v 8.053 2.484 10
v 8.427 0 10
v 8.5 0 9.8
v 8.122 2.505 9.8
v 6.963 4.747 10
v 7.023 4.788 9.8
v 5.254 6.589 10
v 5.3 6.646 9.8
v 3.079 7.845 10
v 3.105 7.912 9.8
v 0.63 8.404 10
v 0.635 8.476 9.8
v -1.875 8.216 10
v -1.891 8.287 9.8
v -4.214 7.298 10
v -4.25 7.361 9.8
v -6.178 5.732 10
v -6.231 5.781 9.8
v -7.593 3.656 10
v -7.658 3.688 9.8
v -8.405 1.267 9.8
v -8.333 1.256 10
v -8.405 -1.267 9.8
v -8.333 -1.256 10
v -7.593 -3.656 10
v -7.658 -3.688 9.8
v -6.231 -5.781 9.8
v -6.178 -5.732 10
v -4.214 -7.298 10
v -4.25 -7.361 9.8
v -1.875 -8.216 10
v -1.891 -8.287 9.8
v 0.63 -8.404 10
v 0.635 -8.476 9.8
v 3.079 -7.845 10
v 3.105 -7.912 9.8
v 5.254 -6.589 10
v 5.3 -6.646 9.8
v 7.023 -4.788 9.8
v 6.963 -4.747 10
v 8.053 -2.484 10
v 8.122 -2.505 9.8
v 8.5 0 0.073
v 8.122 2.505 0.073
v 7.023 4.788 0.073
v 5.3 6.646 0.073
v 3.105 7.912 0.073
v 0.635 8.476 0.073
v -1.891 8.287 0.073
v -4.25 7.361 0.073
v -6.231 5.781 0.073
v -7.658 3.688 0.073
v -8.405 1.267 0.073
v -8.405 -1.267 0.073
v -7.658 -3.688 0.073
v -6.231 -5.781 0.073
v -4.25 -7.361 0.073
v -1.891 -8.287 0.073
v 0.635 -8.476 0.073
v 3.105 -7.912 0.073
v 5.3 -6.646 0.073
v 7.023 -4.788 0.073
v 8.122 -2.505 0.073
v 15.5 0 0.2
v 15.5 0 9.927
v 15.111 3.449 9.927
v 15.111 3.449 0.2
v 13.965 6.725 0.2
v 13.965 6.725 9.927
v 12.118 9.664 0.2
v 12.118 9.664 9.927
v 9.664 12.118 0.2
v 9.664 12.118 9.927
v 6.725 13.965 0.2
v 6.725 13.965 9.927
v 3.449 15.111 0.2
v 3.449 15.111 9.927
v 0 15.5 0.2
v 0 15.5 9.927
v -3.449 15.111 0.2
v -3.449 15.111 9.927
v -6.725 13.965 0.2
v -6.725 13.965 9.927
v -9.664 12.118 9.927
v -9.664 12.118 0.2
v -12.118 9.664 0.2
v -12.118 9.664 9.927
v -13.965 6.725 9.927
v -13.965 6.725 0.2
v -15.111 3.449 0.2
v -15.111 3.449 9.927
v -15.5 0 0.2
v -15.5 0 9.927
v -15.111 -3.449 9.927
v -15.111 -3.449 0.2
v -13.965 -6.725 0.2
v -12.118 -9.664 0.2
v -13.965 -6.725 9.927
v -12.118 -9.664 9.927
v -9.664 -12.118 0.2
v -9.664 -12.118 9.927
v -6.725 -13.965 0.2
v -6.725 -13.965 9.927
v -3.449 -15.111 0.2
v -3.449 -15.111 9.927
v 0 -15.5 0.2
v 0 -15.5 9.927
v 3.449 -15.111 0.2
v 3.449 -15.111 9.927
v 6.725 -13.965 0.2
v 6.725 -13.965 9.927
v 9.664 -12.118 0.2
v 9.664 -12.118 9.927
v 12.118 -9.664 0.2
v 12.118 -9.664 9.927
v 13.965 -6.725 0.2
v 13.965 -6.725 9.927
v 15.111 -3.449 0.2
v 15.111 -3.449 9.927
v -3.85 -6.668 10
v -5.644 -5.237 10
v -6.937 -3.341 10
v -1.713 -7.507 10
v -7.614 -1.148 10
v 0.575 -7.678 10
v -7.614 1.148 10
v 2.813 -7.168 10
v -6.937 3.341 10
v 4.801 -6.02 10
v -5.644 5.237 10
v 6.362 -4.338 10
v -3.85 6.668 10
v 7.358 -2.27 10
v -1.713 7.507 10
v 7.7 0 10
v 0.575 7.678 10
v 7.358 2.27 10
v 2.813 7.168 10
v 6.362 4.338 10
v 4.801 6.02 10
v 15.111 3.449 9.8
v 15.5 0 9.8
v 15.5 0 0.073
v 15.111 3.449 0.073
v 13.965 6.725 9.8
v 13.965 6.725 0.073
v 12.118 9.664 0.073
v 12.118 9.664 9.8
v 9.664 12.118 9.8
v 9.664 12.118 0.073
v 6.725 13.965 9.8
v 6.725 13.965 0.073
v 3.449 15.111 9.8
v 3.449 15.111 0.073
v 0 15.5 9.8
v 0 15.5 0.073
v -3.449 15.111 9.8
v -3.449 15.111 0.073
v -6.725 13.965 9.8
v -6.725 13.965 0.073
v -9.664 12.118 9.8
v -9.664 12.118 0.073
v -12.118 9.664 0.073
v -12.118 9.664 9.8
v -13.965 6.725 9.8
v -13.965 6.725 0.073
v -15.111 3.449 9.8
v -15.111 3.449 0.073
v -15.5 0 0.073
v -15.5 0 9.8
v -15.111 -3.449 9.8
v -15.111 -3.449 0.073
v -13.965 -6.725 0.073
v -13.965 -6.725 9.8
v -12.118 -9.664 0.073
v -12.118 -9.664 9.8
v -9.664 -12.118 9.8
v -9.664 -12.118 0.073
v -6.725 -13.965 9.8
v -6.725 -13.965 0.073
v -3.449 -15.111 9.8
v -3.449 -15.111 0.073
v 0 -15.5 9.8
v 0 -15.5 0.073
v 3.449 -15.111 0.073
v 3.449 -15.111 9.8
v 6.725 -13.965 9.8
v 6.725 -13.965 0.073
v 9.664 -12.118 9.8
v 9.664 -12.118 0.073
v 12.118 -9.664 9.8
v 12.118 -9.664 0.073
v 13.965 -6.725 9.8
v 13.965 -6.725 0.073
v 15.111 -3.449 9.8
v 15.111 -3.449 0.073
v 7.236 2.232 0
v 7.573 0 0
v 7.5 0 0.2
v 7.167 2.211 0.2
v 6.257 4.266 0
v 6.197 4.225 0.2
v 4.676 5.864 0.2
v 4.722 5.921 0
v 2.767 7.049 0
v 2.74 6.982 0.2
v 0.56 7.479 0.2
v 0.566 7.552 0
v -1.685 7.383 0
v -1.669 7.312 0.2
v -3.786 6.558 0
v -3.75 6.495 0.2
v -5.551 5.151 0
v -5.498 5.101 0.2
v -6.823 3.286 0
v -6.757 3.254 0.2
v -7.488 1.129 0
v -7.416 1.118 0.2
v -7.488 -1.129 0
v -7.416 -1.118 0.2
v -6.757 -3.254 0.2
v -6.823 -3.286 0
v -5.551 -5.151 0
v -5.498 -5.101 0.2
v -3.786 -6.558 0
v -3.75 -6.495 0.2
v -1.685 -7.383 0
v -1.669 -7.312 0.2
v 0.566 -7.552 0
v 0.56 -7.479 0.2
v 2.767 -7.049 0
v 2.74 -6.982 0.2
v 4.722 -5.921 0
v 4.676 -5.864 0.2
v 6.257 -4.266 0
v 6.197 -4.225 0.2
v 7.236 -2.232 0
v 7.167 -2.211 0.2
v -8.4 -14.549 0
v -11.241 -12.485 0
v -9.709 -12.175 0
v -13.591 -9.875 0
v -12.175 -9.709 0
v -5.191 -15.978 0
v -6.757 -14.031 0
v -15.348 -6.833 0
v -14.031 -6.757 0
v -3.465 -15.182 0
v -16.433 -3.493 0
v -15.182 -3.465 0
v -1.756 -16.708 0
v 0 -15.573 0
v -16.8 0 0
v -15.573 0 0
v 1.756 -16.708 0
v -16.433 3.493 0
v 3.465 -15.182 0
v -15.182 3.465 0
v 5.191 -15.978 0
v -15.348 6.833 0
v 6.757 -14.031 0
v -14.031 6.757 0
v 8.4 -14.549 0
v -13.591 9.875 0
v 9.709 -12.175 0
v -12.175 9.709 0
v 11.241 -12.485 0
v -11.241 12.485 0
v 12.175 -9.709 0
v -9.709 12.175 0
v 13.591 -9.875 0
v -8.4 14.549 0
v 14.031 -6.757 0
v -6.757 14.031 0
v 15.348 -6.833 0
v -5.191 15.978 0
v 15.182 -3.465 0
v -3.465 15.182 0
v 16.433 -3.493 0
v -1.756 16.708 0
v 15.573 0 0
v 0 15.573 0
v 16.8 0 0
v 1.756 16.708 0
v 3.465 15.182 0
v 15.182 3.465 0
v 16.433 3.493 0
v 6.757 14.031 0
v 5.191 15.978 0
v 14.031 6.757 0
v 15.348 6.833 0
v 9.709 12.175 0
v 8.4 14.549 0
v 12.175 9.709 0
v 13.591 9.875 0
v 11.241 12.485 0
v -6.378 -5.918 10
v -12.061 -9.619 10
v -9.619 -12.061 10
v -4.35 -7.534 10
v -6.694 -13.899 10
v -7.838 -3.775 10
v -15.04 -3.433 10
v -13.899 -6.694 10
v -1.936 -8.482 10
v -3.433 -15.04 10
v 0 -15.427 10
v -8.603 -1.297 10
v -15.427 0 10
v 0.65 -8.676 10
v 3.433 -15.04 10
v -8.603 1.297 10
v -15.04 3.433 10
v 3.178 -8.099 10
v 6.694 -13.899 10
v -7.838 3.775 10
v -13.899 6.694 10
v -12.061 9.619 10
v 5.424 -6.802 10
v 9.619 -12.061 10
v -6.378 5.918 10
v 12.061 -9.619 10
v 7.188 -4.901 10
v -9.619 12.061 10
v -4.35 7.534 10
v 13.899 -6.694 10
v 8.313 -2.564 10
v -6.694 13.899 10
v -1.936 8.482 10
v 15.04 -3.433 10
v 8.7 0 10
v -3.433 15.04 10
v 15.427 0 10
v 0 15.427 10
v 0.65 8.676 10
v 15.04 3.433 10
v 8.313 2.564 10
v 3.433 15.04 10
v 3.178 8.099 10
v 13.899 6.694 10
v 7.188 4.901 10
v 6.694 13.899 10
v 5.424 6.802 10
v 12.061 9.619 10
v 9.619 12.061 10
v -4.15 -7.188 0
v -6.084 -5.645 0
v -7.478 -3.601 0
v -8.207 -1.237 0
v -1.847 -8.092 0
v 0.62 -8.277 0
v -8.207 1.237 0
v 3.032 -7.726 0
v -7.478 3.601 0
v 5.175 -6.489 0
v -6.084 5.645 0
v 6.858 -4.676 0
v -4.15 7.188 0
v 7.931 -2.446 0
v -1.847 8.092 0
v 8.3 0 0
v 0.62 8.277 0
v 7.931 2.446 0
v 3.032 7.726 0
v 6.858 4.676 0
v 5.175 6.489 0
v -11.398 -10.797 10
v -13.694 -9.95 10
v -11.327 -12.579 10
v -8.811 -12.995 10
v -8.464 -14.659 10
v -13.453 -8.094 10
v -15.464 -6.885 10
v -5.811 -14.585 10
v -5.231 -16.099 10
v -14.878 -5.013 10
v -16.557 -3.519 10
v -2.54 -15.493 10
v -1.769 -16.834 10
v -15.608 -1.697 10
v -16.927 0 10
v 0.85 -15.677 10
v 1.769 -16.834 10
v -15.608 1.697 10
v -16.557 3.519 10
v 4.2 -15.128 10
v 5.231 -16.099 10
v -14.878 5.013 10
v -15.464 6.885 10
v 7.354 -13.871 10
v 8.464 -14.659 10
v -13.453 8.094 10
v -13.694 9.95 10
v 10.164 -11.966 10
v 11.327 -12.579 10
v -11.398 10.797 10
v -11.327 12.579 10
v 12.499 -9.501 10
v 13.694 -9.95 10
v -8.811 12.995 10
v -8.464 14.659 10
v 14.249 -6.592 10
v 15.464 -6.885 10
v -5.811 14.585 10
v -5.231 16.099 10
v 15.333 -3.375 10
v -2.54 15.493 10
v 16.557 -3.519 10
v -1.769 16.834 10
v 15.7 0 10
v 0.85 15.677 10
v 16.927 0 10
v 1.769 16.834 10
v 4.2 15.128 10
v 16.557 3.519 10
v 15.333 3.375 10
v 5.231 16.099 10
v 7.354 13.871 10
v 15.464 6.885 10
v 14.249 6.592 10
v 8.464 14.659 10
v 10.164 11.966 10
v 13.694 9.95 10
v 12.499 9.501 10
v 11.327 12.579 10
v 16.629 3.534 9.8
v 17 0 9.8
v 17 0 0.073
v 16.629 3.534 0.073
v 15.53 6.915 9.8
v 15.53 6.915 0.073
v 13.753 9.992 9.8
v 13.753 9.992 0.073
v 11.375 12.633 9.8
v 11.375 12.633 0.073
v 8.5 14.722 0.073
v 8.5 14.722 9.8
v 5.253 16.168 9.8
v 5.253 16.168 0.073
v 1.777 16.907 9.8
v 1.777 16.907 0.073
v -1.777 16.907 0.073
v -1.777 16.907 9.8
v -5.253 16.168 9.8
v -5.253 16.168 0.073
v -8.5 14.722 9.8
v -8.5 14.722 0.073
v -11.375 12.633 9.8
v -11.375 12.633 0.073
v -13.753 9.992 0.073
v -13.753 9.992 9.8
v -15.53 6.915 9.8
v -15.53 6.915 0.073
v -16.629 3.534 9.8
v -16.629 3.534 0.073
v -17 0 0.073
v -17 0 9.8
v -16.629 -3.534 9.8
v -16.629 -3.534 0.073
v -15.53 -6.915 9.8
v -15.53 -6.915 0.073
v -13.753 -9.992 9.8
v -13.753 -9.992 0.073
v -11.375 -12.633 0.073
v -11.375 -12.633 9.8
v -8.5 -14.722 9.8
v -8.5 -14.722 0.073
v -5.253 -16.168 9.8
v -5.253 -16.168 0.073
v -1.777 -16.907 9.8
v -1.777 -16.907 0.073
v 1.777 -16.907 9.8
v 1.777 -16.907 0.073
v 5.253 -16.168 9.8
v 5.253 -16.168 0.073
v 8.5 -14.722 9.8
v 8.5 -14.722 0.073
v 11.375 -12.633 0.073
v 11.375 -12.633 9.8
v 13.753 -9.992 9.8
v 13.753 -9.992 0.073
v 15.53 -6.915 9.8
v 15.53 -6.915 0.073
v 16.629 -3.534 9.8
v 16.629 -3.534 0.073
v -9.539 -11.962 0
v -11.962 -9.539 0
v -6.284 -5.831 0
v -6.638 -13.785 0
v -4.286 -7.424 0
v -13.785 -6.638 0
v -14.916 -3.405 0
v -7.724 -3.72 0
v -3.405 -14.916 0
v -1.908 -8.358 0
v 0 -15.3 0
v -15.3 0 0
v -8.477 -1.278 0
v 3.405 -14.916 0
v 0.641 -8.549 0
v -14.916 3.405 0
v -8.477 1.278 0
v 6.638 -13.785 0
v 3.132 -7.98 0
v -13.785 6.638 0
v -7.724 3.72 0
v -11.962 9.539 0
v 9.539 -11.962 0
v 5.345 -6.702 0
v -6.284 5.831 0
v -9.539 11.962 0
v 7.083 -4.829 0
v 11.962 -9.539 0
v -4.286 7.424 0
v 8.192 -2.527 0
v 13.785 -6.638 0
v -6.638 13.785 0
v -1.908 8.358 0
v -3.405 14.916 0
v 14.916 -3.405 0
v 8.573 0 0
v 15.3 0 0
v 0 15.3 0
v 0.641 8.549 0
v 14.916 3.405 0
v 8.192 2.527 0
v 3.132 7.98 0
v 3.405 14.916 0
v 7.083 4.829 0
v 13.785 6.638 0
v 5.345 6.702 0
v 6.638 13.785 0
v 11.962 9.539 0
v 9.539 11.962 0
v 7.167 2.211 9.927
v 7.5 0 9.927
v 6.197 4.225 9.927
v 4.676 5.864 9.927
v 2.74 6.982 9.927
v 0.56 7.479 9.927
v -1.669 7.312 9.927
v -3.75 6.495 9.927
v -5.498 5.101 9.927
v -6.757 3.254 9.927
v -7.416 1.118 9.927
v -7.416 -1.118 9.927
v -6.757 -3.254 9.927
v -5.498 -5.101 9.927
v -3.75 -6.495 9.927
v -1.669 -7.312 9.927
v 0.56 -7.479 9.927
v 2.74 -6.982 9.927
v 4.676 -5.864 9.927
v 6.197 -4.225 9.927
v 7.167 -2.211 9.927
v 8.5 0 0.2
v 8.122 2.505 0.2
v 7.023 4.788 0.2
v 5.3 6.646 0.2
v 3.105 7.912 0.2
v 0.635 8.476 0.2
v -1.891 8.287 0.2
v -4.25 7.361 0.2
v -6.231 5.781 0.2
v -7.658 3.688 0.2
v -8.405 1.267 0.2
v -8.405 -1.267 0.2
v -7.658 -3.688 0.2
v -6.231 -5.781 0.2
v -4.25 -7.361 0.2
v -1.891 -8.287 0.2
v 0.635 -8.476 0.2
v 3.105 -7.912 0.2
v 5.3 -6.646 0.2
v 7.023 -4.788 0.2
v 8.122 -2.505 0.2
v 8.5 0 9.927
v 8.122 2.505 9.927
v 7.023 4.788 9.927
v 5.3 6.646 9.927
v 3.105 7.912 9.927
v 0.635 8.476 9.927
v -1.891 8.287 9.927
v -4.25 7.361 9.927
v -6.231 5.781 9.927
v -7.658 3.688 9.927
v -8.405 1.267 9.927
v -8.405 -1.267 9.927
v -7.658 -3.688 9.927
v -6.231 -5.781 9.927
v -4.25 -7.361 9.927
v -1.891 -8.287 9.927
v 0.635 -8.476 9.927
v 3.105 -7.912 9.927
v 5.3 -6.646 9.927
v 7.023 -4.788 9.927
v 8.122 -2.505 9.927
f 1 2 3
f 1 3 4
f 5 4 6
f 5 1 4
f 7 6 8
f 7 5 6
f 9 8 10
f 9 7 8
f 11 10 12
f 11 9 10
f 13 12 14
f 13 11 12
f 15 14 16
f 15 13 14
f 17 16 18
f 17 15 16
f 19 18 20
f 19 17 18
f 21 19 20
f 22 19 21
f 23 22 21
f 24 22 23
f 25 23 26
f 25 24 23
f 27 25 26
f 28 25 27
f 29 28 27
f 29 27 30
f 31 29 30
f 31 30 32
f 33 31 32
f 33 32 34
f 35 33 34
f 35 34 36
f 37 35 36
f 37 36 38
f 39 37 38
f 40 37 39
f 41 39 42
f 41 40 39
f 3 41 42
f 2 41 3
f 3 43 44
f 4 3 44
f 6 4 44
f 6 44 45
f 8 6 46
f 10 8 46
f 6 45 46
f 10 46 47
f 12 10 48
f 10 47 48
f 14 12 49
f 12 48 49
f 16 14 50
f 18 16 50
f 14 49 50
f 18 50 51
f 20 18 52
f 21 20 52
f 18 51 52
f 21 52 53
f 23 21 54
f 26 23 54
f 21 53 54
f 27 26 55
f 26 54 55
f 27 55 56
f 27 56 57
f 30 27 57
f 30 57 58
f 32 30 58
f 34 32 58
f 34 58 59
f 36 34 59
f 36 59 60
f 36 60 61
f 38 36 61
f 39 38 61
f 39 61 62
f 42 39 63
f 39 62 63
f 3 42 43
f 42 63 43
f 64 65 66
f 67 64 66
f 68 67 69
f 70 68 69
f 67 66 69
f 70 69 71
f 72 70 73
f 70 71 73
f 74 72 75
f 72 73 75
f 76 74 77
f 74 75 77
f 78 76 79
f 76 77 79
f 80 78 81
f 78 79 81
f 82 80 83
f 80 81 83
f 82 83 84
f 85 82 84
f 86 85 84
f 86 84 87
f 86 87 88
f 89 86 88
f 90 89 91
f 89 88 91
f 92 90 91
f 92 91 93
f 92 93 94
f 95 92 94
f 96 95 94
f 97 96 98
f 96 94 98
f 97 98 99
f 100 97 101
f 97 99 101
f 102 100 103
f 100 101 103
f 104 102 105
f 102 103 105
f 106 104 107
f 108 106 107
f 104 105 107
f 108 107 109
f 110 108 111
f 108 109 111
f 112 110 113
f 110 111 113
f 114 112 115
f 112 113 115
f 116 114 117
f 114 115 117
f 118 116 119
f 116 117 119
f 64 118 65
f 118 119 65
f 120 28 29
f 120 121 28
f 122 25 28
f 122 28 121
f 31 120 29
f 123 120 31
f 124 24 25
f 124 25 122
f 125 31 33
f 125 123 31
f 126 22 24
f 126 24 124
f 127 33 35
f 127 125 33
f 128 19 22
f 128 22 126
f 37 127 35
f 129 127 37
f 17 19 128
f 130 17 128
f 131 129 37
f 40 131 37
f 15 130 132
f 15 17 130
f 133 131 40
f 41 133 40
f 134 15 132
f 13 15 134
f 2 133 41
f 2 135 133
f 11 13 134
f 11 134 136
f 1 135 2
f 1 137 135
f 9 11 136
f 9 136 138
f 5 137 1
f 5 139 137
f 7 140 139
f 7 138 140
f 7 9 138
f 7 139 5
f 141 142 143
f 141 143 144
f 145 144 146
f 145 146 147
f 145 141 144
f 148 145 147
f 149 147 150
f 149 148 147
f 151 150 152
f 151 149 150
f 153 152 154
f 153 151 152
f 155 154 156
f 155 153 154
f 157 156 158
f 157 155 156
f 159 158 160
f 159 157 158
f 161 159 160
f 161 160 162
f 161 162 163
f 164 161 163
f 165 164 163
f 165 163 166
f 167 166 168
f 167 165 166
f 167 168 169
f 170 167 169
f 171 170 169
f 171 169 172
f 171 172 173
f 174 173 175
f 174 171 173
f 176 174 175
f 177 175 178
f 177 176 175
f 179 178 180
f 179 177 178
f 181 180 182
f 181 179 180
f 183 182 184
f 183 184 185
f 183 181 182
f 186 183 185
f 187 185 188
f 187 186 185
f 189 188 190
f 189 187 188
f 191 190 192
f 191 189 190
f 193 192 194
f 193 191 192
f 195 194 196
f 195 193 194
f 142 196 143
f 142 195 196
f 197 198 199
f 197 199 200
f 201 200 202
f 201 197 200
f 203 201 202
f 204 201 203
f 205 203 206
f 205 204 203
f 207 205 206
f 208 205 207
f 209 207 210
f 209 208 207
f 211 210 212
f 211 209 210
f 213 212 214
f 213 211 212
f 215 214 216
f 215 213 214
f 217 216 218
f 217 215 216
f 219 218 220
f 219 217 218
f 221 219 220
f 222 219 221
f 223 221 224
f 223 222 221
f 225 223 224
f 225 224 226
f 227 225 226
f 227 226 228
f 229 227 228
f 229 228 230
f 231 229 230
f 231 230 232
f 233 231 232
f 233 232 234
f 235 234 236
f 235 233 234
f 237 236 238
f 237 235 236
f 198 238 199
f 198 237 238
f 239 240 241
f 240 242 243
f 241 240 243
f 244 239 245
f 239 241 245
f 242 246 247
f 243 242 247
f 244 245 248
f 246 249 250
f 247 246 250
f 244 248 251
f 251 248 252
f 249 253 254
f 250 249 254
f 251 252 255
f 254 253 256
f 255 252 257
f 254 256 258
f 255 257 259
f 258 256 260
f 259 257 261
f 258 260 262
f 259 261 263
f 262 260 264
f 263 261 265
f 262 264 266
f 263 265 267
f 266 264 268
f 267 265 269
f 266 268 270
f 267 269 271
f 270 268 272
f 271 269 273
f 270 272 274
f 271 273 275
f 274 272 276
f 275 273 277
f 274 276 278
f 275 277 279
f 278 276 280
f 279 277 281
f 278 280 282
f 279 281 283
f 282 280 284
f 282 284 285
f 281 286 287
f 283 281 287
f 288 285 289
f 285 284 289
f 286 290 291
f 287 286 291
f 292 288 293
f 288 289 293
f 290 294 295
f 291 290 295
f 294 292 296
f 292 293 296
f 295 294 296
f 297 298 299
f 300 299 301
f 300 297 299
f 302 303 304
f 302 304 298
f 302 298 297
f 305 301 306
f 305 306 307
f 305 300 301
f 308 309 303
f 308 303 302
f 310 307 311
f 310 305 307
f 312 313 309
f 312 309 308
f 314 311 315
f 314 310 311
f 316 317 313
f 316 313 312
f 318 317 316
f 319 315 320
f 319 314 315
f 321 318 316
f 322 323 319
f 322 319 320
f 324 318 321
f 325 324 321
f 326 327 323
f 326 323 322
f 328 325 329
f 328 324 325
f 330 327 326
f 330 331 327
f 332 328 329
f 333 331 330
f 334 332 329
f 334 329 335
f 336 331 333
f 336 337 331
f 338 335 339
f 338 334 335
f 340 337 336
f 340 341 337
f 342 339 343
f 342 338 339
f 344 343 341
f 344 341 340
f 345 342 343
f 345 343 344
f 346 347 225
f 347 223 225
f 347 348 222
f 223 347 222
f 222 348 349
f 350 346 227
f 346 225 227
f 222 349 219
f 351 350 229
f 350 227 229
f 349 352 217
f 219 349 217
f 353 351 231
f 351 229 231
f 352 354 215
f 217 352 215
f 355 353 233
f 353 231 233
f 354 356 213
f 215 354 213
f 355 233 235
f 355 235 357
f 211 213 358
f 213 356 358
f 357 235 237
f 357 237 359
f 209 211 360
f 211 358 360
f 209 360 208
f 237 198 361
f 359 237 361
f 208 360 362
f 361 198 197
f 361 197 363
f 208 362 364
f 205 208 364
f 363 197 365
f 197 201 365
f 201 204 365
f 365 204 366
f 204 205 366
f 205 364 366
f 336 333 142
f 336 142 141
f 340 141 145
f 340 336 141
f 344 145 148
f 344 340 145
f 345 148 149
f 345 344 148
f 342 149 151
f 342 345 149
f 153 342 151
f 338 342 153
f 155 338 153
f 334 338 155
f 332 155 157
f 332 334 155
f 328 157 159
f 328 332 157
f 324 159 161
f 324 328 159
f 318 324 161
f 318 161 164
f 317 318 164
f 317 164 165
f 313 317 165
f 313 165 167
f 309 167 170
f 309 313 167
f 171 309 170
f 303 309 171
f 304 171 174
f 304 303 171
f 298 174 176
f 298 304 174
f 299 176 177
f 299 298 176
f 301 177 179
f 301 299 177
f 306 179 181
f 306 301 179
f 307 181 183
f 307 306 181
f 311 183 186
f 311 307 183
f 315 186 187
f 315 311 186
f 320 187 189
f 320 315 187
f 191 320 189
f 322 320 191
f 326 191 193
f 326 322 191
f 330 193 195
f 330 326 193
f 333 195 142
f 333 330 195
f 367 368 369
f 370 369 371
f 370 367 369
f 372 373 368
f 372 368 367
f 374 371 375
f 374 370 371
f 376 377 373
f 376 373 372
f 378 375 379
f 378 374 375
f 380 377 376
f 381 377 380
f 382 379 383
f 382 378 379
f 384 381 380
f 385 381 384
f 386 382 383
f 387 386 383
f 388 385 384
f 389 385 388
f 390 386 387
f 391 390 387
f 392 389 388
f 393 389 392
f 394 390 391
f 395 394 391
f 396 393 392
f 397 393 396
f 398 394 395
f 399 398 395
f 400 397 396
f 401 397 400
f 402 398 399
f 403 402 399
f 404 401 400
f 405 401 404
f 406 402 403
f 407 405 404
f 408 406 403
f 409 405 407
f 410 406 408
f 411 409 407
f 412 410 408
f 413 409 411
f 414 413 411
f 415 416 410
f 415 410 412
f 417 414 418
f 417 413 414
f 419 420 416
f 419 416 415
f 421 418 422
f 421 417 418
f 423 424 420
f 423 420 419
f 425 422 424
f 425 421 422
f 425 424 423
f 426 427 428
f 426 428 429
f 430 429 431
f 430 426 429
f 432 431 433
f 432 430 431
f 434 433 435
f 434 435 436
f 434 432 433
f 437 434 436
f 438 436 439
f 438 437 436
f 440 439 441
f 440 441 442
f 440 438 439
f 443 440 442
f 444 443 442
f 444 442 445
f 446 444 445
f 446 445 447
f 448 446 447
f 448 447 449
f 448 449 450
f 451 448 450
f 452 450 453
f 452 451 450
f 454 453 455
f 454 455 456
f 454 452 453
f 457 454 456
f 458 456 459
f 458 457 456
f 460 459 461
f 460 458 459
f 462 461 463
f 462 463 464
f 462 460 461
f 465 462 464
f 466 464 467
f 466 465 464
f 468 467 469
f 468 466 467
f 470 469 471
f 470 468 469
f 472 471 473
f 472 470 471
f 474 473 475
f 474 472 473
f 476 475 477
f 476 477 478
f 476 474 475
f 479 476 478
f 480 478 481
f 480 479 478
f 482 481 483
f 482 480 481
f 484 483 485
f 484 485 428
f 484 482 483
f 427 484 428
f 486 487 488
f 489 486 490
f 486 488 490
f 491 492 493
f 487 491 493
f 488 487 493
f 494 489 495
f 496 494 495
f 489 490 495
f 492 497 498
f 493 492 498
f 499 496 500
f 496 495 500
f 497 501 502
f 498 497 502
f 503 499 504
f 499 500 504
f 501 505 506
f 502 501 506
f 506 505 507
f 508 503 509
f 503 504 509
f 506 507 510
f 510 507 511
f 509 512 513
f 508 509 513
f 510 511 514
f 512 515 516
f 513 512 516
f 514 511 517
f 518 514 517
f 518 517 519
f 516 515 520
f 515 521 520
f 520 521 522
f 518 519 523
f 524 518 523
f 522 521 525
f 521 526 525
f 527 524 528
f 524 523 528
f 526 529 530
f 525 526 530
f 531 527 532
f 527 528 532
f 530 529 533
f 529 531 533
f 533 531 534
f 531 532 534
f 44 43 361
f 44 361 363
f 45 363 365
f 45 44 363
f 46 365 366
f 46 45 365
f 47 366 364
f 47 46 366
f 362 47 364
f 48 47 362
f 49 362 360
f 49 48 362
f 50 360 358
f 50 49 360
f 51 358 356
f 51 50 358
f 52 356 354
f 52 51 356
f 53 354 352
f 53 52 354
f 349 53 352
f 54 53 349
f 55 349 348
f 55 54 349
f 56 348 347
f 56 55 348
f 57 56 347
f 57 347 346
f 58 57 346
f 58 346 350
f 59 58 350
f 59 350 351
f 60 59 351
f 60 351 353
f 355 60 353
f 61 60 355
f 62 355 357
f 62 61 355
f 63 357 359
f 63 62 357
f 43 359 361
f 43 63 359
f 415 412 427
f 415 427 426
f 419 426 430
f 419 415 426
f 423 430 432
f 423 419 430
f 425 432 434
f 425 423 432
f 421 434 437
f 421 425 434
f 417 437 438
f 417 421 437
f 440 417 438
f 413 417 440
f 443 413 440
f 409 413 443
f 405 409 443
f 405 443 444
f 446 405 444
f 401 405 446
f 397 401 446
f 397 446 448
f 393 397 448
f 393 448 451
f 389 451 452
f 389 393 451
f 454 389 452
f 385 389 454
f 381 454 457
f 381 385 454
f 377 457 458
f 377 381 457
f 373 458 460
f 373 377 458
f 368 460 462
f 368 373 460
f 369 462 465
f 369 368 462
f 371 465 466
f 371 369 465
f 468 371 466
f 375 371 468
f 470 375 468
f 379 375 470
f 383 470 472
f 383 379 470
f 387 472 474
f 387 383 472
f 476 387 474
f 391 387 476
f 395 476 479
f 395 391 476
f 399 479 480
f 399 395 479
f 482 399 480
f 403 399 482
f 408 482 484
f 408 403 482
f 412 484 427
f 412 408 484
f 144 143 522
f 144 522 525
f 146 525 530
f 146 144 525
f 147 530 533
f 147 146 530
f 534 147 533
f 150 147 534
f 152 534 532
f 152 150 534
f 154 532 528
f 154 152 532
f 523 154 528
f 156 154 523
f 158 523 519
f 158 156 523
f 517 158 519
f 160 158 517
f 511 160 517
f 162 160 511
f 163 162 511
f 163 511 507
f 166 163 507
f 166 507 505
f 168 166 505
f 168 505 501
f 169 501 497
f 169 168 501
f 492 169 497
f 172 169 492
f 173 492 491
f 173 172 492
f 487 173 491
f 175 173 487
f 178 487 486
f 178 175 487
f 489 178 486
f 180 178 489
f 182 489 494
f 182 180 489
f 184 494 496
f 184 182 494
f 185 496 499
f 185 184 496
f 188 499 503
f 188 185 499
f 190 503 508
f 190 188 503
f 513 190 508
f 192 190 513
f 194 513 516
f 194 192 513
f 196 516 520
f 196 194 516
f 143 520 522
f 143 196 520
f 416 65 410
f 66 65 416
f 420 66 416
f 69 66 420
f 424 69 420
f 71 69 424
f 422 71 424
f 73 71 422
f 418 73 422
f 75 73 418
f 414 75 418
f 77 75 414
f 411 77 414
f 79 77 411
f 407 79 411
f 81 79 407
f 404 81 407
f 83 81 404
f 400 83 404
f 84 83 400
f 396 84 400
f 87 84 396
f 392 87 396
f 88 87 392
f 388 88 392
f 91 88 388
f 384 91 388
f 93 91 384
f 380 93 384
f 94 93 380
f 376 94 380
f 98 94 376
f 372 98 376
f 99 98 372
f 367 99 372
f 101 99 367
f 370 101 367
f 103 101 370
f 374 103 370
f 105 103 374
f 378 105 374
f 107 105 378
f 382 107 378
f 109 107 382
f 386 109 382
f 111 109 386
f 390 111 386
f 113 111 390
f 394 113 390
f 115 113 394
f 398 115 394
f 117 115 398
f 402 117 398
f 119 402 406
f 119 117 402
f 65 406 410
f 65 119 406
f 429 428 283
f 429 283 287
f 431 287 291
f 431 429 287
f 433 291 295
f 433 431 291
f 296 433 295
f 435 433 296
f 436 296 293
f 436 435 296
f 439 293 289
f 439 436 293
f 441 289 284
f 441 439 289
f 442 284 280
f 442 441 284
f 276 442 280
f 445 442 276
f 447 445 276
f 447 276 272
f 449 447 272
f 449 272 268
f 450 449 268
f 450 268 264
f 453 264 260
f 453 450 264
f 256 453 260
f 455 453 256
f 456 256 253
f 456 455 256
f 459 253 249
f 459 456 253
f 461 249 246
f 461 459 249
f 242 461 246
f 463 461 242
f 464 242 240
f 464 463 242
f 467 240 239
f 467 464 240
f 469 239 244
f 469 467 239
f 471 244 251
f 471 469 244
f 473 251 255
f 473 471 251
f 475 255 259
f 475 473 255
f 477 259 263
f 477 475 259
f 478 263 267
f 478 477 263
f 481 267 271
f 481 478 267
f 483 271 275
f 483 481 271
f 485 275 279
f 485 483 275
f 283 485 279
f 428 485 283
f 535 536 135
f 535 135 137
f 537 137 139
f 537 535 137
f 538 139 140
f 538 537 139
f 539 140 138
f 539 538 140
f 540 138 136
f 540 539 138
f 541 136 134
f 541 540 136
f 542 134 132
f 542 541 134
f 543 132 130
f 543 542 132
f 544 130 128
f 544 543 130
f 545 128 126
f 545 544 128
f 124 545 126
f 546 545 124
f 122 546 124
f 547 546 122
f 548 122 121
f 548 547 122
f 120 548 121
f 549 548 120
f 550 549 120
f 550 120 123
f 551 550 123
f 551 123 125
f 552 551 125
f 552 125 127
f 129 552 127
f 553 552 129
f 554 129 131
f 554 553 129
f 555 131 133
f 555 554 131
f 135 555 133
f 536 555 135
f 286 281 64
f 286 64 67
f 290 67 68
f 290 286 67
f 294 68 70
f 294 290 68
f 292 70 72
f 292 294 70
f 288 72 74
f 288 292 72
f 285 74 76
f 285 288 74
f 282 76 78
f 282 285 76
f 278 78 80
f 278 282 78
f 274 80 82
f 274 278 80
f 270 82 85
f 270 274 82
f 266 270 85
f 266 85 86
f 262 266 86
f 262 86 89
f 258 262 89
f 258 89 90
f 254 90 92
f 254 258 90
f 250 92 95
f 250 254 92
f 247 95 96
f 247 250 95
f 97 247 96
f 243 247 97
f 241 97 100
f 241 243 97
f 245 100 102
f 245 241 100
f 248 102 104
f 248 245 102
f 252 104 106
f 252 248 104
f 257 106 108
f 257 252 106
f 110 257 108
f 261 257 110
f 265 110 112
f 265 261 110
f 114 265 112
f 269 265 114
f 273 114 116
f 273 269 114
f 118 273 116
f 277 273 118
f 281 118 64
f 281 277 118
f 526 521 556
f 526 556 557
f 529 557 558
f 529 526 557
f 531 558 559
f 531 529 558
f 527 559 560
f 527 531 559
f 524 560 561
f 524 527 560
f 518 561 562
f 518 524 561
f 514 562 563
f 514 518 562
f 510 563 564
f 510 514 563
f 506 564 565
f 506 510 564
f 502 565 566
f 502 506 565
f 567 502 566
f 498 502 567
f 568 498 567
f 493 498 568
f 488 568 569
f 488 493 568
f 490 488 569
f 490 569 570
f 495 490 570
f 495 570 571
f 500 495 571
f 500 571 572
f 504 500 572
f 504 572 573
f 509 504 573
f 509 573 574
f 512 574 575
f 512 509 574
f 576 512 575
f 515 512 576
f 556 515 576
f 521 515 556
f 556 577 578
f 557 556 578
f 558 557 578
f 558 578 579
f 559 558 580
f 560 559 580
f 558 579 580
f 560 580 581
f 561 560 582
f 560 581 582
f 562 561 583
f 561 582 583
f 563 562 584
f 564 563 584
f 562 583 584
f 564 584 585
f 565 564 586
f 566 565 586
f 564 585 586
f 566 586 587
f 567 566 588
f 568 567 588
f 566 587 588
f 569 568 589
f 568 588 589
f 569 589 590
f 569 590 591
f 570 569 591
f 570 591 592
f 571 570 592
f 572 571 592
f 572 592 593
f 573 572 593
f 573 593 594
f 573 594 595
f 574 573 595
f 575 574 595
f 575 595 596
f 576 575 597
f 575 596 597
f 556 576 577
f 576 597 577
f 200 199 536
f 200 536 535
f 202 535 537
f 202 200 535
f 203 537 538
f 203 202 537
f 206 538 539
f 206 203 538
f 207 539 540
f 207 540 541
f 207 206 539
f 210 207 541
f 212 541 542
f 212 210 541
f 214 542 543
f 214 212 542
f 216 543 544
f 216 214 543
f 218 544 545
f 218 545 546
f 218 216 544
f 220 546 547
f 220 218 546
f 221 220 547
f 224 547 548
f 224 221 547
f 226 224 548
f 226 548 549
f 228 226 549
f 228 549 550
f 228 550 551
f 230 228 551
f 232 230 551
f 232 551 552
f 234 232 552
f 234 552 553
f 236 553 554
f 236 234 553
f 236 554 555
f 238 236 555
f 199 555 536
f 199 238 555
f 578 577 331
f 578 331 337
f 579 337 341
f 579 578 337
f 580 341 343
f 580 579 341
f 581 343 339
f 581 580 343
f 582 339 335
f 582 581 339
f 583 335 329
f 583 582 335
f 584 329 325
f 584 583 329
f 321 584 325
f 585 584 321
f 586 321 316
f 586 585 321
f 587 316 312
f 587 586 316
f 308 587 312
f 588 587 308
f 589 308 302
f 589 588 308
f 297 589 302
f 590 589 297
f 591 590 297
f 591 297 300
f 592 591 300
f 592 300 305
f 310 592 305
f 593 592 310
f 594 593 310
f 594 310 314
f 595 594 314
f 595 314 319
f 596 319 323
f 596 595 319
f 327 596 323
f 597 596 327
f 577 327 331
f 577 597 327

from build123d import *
from OCP.BRepFilletAPI import BRepFilletAPI_MakeChamfer

# Parameters (mm, degrees)
SKETCH1_R           = 8.5
SKETCH1_R_2         = 7.5
BOSS_EXTRUDE1_DEPTH = 10
SKETCH2_R           = 15.5
SKETCH2_R_2         = 8.5
BOSS_EXTRUDE2_DEPTH = 10
SKETCH3_R           = 17
SKETCH3_R_2         = 15.5
BOSS_EXTRUDE3_DEPTH = 10
CHAMFER1_SIZE       = 0.2
CHAMFER1_SIZE2      = 0.072794047
CHAMFER2_SIZE       = 0.2
CHAMFER2_SIZE2      = 0.072794047
CHAMFER3_SIZE       = 0.2
CHAMFER3_SIZE2      = 0.072794047


with BuildPart() as part:
    # Sketch1 → Boss-Extrude1 (new body)
    with BuildSketch(Plane.XY):
        Circle(SKETCH1_R)
        Circle(SKETCH1_R_2, mode=Mode.SUBTRACT)
    extrude(amount=BOSS_EXTRUDE1_DEPTH)

    # Chamfer1: one chamfer whose edges measure the first distance from different faces: ONE call of the kernel's chamfer builder (chamfer() names one face for all edges)
    chamfer1_edges_1 = [part.edges().sort_by_distance(p)[0] for p in [
        (-8.5, 0, 0),
    ]]
    chamfer1_side_1 = [part.faces().sort_by_distance(p)[0] for p in [
        (-8.259583694, 0, 0),
    ]]
    chamfer1_edges_2 = [part.edges().sort_by_distance(p)[0] for p in [
        (-8.5, 0, 10),
    ]]
    chamfer1_side_2 = [part.faces().sort_by_distance(p)[0] for p in [
        (-8.5, 0, 5),
    ]]
    chamfer1_edges_3 = [part.edges().sort_by_distance(p)[0] for p in [
        (-7.5, 0, 0),
    ]]
    chamfer1_side_3 = [part.faces().sort_by_distance(p)[0] for p in [
        (-7.5, 0, 5),
    ]]
    chamfer1_edges_4 = [part.edges().sort_by_distance(p)[0] for p in [
        (-7.5, 0, 10),
    ]]
    chamfer1_side_4 = [part.faces().sort_by_distance(p)[0] for p in [
        (-8.259583694, 0, 10),
    ]]
    chamfer1 = BRepFilletAPI_MakeChamfer(part.part.solid().wrapped)
    for e in chamfer1_edges_1:
        chamfer1.Add(CHAMFER1_SIZE, CHAMFER1_SIZE2, e.wrapped, chamfer1_side_1[0].wrapped)  # the first distance lies on this face
    for e in chamfer1_edges_2:
        chamfer1.Add(CHAMFER1_SIZE, CHAMFER1_SIZE2, e.wrapped, chamfer1_side_2[0].wrapped)  # the first distance lies on this face
    for e in chamfer1_edges_3:
        chamfer1.Add(CHAMFER1_SIZE, CHAMFER1_SIZE2, e.wrapped, chamfer1_side_3[0].wrapped)  # the first distance lies on this face
    for e in chamfer1_edges_4:
        chamfer1.Add(CHAMFER1_SIZE, CHAMFER1_SIZE2, e.wrapped, chamfer1_side_4[0].wrapped)  # the first distance lies on this face
    add(Compound.cast(chamfer1.Shape()), mode=Mode.REPLACE)


with BuildPart() as body_2:
    # Sketch2 → Boss-Extrude2 (new body)
    with BuildSketch(Plane.XY.offset(10)):
        Circle(SKETCH2_R)
        Circle(SKETCH2_R_2, mode=Mode.SUBTRACT)
    extrude(amount=-BOSS_EXTRUDE2_DEPTH)

    # Chamfer2: one chamfer whose edges measure the first distance from different faces: ONE call of the kernel's chamfer builder (chamfer() names one face for all edges)
    chamfer2_edges_1 = [body_2.edges().sort_by_distance(p)[0] for p in [
        (-15.5, 0, 10),
    ]]
    chamfer2_side_1 = [body_2.faces().sort_by_distance(p)[0] for p in [
        (-15.5, 0, 5),
    ]]
    chamfer2_edges_2 = [body_2.edges().sort_by_distance(p)[0] for p in [
        (-15.5, 0, 0),
    ]]
    chamfer2_side_2 = [body_2.faces().sort_by_distance(p)[0] for p in [
        (-15.061593796, 0, 0),
    ]]
    chamfer2_edges_3 = [body_2.edges().sort_by_distance(p)[0] for p in [
        (-8.5, 0, 0),
    ]]
    chamfer2_side_3 = [body_2.faces().sort_by_distance(p)[0] for p in [
        (-8.5, 0, 5),
    ]]
    chamfer2_edges_4 = [body_2.edges().sort_by_distance(p)[0] for p in [
        (-8.5, 0, 10),
    ]]
    chamfer2_side_4 = [body_2.faces().sort_by_distance(p)[0] for p in [
        (-15.061593796, 0, 10),
    ]]
    chamfer2 = BRepFilletAPI_MakeChamfer(body_2.part.solid().wrapped)
    for e in chamfer2_edges_1:
        chamfer2.Add(CHAMFER2_SIZE, CHAMFER2_SIZE2, e.wrapped, chamfer2_side_1[0].wrapped)  # the first distance lies on this face
    for e in chamfer2_edges_2:
        chamfer2.Add(CHAMFER2_SIZE, CHAMFER2_SIZE2, e.wrapped, chamfer2_side_2[0].wrapped)  # the first distance lies on this face
    for e in chamfer2_edges_3:
        chamfer2.Add(CHAMFER2_SIZE, CHAMFER2_SIZE2, e.wrapped, chamfer2_side_3[0].wrapped)  # the first distance lies on this face
    for e in chamfer2_edges_4:
        chamfer2.Add(CHAMFER2_SIZE, CHAMFER2_SIZE2, e.wrapped, chamfer2_side_4[0].wrapped)  # the first distance lies on this face
    add(Compound.cast(chamfer2.Shape()), mode=Mode.REPLACE)


with BuildPart() as body_3:
    # Sketch3 → Boss-Extrude3 (new body)
    with BuildSketch(Plane.XY.offset(10)):
        Circle(SKETCH3_R)
        Circle(SKETCH3_R_2, mode=Mode.SUBTRACT)
    extrude(amount=-BOSS_EXTRUDE3_DEPTH)

    # Chamfer3: one chamfer whose edges measure the first distance from different faces: ONE call of the kernel's chamfer builder (chamfer() names one face for all edges)
    chamfer3_edges_1 = [body_3.edges().sort_by_distance(p)[0] for p in [
        (-17, 0, 10),
    ]]
    chamfer3_side_1 = [body_3.faces().sort_by_distance(p)[0] for p in [
        (-17, 0, 5),
    ]]
    chamfer3_edges_2 = [body_3.edges().sort_by_distance(p)[0] for p in [
        (-17, 0, 0),
    ]]
    chamfer3_side_2 = [body_3.faces().sort_by_distance(p)[0] for p in [
        (-16.519167389, 0, 0),
    ]]
    chamfer3_edges_3 = [body_3.edges().sort_by_distance(p)[0] for p in [
        (-15.5, 0, 0),
    ]]
    chamfer3_side_3 = [body_3.faces().sort_by_distance(p)[0] for p in [
        (-15.5, 0, 5),
    ]]
    chamfer3_edges_4 = [body_3.edges().sort_by_distance(p)[0] for p in [
        (-15.5, 0, 10),
    ]]
    chamfer3_side_4 = [body_3.faces().sort_by_distance(p)[0] for p in [
        (-16.519167389, 0, 10),
    ]]
    chamfer3 = BRepFilletAPI_MakeChamfer(body_3.part.solid().wrapped)
    for e in chamfer3_edges_1:
        chamfer3.Add(CHAMFER3_SIZE, CHAMFER3_SIZE2, e.wrapped, chamfer3_side_1[0].wrapped)  # the first distance lies on this face
    for e in chamfer3_edges_2:
        chamfer3.Add(CHAMFER3_SIZE, CHAMFER3_SIZE2, e.wrapped, chamfer3_side_2[0].wrapped)  # the first distance lies on this face
    for e in chamfer3_edges_3:
        chamfer3.Add(CHAMFER3_SIZE, CHAMFER3_SIZE2, e.wrapped, chamfer3_side_3[0].wrapped)  # the first distance lies on this face
    for e in chamfer3_edges_4:
        chamfer3.Add(CHAMFER3_SIZE, CHAMFER3_SIZE2, e.wrapped, chamfer3_side_4[0].wrapped)  # the first distance lies on this face
    add(Compound.cast(chamfer3.Shape()), mode=Mode.REPLACE)


solid = Compound([part.part, body_2.part, body_3.part])
